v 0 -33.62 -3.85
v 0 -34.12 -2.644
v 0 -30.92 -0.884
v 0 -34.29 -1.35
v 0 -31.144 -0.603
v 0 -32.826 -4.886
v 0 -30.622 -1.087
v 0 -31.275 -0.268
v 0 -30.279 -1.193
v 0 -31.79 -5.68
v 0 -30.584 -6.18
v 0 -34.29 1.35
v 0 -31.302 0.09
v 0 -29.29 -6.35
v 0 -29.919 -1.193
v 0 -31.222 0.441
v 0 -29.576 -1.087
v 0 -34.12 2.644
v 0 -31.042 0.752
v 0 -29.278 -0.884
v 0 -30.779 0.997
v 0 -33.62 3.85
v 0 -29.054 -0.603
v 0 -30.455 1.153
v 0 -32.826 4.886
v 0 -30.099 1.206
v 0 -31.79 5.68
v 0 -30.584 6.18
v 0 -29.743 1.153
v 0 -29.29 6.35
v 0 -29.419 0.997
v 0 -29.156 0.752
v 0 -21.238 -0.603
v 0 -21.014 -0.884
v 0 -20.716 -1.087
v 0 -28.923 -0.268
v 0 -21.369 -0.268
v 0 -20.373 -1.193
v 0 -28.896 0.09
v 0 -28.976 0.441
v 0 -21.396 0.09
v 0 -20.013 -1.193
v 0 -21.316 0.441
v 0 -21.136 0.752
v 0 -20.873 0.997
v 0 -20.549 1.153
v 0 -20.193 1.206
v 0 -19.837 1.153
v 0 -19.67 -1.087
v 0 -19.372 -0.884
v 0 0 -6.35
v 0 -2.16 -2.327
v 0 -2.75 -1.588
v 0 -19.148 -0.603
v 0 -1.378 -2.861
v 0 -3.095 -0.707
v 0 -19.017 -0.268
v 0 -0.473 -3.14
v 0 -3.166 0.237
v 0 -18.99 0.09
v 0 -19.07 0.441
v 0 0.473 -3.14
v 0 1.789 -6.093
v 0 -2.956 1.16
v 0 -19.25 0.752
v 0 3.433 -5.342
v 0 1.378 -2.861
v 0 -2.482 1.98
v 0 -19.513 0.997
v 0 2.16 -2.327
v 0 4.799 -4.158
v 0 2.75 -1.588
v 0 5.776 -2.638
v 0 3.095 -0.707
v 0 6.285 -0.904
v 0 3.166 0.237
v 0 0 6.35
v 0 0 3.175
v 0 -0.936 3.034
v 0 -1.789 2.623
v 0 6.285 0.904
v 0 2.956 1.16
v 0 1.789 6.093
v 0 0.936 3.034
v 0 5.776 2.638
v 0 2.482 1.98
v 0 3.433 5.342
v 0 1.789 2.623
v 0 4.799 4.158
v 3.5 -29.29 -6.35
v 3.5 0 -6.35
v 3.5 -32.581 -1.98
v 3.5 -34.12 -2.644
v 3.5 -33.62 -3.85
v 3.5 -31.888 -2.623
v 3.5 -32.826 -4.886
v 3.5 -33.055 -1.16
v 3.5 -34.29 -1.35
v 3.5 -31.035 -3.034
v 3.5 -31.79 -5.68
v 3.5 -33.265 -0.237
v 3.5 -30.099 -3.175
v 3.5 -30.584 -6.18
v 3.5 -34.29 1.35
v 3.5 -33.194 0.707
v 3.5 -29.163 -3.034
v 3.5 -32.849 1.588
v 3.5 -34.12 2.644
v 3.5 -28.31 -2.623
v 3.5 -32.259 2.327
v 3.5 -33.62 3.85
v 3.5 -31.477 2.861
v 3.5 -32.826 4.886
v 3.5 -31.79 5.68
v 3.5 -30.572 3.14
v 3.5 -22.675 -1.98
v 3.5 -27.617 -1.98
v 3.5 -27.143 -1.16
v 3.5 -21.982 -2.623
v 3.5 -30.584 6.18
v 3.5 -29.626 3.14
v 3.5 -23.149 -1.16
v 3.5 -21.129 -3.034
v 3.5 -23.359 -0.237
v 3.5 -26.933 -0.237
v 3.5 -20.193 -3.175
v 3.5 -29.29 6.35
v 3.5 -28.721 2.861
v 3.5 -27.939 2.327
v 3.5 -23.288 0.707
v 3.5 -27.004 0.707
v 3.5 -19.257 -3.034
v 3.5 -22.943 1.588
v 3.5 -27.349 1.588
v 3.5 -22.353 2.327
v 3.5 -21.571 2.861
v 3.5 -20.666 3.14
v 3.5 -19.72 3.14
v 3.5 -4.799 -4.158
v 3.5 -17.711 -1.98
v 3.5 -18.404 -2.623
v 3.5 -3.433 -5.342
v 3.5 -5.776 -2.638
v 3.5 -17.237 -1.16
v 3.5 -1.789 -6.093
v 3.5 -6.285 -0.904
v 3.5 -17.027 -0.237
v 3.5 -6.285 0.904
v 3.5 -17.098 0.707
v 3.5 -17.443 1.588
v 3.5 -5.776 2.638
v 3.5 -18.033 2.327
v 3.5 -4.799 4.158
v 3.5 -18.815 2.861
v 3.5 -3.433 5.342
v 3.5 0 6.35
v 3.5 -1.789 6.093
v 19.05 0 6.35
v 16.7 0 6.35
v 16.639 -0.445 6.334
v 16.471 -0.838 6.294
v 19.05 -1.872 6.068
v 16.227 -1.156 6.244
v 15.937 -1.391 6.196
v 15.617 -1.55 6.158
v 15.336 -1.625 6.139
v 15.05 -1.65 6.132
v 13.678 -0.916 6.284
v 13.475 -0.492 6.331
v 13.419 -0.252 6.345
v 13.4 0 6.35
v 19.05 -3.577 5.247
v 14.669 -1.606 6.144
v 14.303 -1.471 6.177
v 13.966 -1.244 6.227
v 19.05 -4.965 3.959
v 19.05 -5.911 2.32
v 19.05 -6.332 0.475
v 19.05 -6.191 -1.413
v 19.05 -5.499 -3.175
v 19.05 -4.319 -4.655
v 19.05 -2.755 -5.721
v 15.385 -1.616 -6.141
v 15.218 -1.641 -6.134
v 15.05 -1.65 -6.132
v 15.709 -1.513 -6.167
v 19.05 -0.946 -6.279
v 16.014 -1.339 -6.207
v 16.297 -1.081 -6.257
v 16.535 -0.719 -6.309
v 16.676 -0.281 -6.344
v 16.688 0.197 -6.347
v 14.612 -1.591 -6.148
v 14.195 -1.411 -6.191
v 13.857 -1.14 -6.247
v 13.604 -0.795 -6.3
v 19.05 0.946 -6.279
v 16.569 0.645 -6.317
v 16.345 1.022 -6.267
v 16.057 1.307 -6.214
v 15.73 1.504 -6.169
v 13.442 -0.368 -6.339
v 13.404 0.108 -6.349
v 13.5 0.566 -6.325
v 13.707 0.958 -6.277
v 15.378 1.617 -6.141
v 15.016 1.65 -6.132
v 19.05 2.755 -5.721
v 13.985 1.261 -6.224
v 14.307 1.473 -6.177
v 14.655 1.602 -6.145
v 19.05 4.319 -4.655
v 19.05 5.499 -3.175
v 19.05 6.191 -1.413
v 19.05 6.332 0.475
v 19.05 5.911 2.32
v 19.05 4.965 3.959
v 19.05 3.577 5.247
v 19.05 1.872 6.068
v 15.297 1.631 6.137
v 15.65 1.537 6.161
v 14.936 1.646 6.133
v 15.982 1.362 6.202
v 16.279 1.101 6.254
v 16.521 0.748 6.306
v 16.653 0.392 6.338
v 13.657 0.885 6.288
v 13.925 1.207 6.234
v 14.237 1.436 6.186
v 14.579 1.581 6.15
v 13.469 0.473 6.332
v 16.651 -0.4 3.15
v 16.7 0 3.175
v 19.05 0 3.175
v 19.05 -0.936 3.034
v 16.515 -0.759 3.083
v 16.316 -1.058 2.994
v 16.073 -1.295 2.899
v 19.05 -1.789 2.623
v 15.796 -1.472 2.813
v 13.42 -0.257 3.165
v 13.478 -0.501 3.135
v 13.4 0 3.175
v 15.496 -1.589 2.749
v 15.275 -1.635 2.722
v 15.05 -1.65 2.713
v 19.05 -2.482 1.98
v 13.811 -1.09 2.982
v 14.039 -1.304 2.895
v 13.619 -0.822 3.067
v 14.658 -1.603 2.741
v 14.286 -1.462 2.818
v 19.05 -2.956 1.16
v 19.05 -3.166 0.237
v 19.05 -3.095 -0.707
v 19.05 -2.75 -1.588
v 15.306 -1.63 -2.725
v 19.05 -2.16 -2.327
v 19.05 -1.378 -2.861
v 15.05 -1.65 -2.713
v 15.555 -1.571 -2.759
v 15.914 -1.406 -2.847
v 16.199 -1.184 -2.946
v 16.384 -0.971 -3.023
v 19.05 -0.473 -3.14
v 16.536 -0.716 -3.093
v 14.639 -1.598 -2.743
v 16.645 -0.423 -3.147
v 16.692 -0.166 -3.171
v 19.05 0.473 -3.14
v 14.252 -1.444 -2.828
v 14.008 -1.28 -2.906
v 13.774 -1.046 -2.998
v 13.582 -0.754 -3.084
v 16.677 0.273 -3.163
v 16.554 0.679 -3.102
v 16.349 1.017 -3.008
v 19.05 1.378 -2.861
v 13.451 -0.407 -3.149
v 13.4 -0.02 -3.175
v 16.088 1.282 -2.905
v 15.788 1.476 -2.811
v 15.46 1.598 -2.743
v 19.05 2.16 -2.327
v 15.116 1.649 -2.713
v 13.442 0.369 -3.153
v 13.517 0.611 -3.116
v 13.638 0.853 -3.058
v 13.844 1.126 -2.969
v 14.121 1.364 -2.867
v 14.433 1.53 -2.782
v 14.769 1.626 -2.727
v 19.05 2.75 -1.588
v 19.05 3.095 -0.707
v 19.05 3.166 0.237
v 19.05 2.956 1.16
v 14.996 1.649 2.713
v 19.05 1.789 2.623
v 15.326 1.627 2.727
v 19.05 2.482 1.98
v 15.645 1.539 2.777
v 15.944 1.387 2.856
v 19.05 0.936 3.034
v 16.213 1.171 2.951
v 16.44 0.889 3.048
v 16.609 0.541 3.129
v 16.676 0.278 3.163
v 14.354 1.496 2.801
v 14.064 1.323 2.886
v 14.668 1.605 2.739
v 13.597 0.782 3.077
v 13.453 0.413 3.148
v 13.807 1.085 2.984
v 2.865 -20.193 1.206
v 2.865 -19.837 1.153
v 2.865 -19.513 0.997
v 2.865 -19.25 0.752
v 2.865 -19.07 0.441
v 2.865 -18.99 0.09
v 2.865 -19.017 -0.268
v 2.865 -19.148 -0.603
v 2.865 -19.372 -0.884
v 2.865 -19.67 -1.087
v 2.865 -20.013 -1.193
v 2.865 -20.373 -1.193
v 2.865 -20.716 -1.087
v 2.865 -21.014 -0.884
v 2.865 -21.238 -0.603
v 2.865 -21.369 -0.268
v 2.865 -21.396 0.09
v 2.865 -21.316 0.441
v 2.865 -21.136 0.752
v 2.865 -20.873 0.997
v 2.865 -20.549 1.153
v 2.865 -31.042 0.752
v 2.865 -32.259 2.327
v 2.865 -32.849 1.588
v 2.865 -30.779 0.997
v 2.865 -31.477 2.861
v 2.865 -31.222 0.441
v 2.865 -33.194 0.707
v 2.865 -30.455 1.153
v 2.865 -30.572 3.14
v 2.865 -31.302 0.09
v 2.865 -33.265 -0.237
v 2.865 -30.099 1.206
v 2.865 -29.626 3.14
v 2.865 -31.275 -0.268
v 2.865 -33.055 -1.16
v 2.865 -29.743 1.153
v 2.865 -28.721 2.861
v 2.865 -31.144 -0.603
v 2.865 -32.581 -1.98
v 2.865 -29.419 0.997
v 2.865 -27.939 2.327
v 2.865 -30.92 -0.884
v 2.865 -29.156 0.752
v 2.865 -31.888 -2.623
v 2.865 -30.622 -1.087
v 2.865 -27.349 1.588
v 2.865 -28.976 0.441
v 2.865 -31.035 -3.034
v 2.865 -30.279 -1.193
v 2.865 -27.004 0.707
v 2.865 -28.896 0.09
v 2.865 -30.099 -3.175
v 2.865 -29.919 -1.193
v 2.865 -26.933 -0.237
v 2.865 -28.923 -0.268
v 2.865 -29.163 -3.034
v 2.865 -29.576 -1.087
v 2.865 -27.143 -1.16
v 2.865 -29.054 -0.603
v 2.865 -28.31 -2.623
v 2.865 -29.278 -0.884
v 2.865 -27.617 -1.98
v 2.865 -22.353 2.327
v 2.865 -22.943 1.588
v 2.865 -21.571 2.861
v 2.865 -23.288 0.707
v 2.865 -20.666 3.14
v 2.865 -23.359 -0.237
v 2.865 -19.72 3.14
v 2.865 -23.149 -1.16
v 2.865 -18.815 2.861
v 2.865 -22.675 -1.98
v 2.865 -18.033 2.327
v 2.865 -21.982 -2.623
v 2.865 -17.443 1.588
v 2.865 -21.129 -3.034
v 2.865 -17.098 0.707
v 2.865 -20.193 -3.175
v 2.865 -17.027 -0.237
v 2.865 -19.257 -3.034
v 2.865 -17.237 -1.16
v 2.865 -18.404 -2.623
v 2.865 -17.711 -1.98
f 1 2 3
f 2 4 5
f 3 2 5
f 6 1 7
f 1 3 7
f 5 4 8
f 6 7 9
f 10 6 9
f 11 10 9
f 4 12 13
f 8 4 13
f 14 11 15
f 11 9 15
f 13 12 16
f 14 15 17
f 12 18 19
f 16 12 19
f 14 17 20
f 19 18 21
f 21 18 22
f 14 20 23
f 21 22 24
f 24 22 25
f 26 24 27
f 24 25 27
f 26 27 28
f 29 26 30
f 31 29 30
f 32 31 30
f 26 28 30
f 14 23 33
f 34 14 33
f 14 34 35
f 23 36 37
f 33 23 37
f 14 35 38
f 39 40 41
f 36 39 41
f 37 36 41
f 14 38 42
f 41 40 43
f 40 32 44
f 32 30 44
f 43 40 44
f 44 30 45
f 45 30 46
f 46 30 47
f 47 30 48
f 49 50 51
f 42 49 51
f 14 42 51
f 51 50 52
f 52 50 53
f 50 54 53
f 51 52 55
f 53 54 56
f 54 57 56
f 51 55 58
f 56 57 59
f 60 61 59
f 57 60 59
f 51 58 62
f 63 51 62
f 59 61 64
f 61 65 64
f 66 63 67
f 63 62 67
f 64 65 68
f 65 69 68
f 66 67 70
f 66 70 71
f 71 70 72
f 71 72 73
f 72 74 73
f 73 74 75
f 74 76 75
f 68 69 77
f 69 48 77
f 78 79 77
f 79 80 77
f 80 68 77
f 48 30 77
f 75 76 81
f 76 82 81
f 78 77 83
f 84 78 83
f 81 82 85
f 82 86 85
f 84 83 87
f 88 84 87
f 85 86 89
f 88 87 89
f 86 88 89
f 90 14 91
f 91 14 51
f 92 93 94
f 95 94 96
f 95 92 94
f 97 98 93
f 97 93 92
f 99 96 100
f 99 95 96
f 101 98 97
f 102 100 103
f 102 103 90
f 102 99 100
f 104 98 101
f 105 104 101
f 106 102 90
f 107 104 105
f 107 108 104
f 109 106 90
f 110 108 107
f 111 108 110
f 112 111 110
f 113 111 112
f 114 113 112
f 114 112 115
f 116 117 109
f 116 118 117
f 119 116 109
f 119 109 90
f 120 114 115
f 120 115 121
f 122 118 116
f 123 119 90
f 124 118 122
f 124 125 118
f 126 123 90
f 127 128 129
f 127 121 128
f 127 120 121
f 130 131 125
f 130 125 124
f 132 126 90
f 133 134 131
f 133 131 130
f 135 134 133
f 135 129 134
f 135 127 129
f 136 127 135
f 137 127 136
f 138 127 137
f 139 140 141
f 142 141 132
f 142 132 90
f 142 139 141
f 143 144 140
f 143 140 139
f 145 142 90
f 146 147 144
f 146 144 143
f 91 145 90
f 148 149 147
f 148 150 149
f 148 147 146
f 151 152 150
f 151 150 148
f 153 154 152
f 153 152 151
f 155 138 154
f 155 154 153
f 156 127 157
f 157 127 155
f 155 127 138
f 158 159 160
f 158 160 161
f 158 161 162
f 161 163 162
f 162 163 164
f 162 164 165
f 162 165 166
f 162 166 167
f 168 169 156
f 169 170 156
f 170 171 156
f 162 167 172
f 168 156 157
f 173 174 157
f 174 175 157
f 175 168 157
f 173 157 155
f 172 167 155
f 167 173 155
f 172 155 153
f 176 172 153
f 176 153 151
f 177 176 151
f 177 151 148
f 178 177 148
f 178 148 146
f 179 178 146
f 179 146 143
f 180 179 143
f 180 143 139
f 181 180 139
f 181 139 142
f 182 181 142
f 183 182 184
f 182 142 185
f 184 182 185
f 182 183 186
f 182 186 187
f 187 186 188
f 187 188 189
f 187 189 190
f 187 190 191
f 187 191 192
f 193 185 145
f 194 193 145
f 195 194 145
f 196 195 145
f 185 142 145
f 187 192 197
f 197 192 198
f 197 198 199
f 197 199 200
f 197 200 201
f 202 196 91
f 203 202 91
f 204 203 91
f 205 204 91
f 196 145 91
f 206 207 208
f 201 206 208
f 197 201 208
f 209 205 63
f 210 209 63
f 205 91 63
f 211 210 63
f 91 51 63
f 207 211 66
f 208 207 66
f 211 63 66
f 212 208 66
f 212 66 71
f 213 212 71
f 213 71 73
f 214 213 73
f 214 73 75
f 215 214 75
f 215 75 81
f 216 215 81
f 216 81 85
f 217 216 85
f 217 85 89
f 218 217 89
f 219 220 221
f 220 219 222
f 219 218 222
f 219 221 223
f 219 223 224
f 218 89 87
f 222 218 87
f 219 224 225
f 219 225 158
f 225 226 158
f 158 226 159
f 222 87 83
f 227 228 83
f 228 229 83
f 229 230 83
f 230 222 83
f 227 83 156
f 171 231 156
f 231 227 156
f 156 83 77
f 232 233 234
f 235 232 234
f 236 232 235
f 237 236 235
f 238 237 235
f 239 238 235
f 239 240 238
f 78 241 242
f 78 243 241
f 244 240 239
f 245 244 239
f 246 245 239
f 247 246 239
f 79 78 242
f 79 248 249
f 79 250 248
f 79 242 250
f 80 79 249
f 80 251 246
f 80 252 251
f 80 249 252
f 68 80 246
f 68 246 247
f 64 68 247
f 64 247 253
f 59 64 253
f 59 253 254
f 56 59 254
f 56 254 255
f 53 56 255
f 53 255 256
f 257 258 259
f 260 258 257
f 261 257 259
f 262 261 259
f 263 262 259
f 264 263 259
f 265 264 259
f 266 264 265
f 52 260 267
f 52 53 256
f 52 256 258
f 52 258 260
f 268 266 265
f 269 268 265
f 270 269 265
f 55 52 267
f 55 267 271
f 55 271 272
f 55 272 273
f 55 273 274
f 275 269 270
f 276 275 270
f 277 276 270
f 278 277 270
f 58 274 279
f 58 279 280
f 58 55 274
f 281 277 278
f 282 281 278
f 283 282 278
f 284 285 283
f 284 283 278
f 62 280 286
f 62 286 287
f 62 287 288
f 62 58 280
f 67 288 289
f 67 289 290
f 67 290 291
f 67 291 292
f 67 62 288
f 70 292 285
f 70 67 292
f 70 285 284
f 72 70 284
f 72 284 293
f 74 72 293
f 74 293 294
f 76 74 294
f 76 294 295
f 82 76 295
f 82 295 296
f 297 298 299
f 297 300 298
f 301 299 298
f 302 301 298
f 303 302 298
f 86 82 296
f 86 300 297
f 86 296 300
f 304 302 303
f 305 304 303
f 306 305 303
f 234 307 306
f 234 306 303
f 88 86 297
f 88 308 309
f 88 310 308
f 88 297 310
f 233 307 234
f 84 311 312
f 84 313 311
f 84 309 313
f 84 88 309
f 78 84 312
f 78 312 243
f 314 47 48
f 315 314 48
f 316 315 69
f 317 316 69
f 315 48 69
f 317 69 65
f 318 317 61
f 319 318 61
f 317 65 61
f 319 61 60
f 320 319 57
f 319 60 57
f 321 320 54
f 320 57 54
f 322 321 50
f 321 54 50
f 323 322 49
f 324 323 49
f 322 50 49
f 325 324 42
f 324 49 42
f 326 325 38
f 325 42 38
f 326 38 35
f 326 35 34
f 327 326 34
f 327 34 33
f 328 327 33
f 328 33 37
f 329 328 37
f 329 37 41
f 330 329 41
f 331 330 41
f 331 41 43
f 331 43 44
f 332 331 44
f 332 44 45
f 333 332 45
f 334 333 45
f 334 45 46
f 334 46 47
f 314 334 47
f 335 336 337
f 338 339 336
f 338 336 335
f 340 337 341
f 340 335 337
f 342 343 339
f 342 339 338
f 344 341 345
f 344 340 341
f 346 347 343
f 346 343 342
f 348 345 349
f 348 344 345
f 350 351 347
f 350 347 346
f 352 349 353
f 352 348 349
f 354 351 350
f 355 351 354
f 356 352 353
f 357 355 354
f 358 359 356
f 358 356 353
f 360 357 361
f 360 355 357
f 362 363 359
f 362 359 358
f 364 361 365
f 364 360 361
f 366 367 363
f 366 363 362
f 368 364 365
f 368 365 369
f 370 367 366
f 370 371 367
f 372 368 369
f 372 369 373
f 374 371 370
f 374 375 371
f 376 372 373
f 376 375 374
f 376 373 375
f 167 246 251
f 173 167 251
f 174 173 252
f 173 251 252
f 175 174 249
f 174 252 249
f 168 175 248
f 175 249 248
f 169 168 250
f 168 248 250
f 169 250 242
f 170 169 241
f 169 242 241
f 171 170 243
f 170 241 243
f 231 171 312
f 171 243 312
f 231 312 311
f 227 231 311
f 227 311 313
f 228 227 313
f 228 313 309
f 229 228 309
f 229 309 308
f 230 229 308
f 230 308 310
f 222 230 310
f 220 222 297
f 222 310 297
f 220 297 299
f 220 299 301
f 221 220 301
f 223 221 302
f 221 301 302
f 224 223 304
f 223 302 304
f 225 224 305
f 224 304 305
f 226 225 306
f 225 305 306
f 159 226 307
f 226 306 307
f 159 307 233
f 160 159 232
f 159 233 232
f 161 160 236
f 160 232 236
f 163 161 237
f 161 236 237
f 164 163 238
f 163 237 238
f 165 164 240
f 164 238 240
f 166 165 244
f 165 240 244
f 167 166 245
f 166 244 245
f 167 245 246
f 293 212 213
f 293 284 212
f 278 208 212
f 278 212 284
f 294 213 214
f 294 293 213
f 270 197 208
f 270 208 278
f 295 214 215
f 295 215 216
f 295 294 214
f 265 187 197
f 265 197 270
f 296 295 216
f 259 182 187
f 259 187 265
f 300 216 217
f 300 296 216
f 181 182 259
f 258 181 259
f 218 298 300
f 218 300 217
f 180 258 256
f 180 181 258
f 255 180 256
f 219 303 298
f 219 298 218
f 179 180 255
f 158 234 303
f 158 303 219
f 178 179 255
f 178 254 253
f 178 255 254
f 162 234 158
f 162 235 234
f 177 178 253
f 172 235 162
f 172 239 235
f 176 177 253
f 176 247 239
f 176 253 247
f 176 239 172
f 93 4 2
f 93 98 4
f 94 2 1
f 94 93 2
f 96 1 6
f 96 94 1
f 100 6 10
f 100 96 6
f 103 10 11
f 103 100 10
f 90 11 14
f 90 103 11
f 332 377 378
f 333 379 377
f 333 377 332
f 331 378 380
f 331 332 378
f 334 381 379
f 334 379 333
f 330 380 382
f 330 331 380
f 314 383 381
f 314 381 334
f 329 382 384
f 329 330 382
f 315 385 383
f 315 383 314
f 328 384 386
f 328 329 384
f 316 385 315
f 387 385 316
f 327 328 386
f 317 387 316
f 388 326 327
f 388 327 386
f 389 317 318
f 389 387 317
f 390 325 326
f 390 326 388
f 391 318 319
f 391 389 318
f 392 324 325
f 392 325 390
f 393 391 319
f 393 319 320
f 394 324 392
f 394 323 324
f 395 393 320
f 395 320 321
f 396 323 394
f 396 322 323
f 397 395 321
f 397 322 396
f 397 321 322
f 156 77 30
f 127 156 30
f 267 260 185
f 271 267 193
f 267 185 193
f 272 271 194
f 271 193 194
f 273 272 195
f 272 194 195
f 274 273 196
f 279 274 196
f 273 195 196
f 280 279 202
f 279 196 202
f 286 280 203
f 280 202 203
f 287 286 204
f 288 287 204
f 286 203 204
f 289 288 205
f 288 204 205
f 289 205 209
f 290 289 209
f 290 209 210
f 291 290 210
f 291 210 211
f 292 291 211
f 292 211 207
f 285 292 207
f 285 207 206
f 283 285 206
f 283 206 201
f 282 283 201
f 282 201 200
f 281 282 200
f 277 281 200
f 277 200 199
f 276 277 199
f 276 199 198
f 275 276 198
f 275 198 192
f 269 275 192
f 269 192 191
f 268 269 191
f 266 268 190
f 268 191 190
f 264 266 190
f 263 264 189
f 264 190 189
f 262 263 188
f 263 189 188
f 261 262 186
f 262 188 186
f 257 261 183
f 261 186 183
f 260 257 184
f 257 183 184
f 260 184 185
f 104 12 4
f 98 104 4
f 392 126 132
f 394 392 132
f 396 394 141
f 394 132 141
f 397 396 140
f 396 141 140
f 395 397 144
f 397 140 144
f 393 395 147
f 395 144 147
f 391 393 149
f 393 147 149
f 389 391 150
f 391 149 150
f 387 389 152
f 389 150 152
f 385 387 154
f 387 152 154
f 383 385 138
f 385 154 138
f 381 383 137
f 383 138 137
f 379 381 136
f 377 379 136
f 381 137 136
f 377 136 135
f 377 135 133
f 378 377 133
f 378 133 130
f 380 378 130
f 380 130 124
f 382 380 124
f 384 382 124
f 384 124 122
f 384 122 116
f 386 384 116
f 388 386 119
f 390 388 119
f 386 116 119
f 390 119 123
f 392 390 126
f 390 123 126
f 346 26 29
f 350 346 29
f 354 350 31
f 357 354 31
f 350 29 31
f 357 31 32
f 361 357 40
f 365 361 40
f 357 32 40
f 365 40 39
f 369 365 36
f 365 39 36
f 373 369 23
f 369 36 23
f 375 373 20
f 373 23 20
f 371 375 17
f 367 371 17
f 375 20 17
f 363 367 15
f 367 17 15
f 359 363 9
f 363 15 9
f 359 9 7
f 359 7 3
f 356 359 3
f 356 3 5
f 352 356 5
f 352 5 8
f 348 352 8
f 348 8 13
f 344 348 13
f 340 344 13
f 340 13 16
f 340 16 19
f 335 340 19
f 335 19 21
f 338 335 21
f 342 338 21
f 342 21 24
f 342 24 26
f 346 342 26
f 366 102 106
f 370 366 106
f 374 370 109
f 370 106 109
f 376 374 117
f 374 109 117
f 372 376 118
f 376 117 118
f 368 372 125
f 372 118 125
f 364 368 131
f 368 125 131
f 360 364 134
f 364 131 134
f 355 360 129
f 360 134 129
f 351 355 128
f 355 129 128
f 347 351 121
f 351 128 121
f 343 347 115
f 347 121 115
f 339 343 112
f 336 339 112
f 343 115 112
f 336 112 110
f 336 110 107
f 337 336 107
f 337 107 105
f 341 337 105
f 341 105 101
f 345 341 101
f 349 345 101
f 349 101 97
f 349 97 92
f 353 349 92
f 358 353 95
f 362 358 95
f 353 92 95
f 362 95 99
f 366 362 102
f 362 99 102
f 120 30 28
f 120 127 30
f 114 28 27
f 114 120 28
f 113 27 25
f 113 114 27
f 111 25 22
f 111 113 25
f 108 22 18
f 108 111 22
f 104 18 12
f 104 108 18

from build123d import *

# Parameters (mm, degrees)
SKETCH1_R             = 6.35
SKETCH1_R_2           = 3.175
BOSS_EXTRUDE1_DEPTH   = 19.05
M4X0_7_TAPPED_HOLE1_D = 3.3
BOSS_EXTRUDE3_DEPTH   = 3.5
FILLET2_R             = 5
SKETCH11_R            = 1.2065
CUT_EXTRUDE1_DEPTH    = 40.736999196
SKETCH12_R            = 3.175
CUT_EXTRUDE2_DEPTH    = 0.635


with BuildPart() as part:
    # Sketch1 → Boss-Extrude1 (new body)
    with BuildSketch(Plane.YZ):
        with Locations(Location((0, 0, 0), (0, 0, 90))):
            Circle(SKETCH1_R)
        with Locations(Location((0, 0, 0), (0, 0, 90))):
            Circle(SKETCH1_R_2, mode=Mode.SUBTRACT)
    extrude(amount=BOSS_EXTRUDE1_DEPTH)

    # M4x0.7 Tapped Hole1 (through all)
    with Locations(Plane(origin=(0, 0, 6.35), x_dir=(0, 1, 0), z_dir=(0, 0, 1))):
        with Locations((0, -15.05)):
            Hole(M4X0_7_TAPPED_HOLE1_D / 2)

    # Sketch10 → Boss-Extrude3 (add)
    with BuildSketch(Plane(origin=(0, 0, 0), x_dir=(0, -1, 0), z_dir=(-1, 0, 0))):
        with BuildLine():
            Line((0, 6.35), (34.29, 6.35))
            Line((34.29, 6.35), (34.29, -6.35))
            Line((34.29, -6.35), (0, -6.35))
            ThreePointArc((0, -6.35), (6.35, 0), (0, 6.35))
        make_face()
    extrude(amount=-BOSS_EXTRUDE3_DEPTH)

    # Fillet2
    fillet2_edges = [part.edges().sort_by_distance(p)[0] for p in [
        (1.75, -34.29, -6.35),
        (1.75, -34.29, 6.35),
    ]]
    fillet(fillet2_edges, radius=FILLET2_R)

    # Sketch11 → Cut-Extrude1 (cut, through all)
    with BuildSketch(Plane(origin=(0, 0, 0), x_dir=(0, -1, 0), z_dir=(-1, 0, 0))):
        with Locations(Location((30.099, 0, 0), (0, 0, 90))):
            Circle(SKETCH11_R)
        with Locations(Location((20.193, 0, 0), (0, 0, 90))):
            Circle(SKETCH11_R)
    extrude(amount=-CUT_EXTRUDE1_DEPTH, mode=Mode.SUBTRACT)

    # Sketch12 → Cut-Extrude2 (cut)
    with BuildSketch(Plane.YZ.offset(3.5)):
        with Locations(Location((-20.193, 0, 0), (0, 0, 270))):
            Circle(SKETCH12_R)
        with Locations(Location((-30.099, 0, 0), (0, 0, 270))):
            Circle(SKETCH12_R)
    extrude(amount=-CUT_EXTRUDE2_DEPTH, mode=Mode.SUBTRACT)


solid = part.part
